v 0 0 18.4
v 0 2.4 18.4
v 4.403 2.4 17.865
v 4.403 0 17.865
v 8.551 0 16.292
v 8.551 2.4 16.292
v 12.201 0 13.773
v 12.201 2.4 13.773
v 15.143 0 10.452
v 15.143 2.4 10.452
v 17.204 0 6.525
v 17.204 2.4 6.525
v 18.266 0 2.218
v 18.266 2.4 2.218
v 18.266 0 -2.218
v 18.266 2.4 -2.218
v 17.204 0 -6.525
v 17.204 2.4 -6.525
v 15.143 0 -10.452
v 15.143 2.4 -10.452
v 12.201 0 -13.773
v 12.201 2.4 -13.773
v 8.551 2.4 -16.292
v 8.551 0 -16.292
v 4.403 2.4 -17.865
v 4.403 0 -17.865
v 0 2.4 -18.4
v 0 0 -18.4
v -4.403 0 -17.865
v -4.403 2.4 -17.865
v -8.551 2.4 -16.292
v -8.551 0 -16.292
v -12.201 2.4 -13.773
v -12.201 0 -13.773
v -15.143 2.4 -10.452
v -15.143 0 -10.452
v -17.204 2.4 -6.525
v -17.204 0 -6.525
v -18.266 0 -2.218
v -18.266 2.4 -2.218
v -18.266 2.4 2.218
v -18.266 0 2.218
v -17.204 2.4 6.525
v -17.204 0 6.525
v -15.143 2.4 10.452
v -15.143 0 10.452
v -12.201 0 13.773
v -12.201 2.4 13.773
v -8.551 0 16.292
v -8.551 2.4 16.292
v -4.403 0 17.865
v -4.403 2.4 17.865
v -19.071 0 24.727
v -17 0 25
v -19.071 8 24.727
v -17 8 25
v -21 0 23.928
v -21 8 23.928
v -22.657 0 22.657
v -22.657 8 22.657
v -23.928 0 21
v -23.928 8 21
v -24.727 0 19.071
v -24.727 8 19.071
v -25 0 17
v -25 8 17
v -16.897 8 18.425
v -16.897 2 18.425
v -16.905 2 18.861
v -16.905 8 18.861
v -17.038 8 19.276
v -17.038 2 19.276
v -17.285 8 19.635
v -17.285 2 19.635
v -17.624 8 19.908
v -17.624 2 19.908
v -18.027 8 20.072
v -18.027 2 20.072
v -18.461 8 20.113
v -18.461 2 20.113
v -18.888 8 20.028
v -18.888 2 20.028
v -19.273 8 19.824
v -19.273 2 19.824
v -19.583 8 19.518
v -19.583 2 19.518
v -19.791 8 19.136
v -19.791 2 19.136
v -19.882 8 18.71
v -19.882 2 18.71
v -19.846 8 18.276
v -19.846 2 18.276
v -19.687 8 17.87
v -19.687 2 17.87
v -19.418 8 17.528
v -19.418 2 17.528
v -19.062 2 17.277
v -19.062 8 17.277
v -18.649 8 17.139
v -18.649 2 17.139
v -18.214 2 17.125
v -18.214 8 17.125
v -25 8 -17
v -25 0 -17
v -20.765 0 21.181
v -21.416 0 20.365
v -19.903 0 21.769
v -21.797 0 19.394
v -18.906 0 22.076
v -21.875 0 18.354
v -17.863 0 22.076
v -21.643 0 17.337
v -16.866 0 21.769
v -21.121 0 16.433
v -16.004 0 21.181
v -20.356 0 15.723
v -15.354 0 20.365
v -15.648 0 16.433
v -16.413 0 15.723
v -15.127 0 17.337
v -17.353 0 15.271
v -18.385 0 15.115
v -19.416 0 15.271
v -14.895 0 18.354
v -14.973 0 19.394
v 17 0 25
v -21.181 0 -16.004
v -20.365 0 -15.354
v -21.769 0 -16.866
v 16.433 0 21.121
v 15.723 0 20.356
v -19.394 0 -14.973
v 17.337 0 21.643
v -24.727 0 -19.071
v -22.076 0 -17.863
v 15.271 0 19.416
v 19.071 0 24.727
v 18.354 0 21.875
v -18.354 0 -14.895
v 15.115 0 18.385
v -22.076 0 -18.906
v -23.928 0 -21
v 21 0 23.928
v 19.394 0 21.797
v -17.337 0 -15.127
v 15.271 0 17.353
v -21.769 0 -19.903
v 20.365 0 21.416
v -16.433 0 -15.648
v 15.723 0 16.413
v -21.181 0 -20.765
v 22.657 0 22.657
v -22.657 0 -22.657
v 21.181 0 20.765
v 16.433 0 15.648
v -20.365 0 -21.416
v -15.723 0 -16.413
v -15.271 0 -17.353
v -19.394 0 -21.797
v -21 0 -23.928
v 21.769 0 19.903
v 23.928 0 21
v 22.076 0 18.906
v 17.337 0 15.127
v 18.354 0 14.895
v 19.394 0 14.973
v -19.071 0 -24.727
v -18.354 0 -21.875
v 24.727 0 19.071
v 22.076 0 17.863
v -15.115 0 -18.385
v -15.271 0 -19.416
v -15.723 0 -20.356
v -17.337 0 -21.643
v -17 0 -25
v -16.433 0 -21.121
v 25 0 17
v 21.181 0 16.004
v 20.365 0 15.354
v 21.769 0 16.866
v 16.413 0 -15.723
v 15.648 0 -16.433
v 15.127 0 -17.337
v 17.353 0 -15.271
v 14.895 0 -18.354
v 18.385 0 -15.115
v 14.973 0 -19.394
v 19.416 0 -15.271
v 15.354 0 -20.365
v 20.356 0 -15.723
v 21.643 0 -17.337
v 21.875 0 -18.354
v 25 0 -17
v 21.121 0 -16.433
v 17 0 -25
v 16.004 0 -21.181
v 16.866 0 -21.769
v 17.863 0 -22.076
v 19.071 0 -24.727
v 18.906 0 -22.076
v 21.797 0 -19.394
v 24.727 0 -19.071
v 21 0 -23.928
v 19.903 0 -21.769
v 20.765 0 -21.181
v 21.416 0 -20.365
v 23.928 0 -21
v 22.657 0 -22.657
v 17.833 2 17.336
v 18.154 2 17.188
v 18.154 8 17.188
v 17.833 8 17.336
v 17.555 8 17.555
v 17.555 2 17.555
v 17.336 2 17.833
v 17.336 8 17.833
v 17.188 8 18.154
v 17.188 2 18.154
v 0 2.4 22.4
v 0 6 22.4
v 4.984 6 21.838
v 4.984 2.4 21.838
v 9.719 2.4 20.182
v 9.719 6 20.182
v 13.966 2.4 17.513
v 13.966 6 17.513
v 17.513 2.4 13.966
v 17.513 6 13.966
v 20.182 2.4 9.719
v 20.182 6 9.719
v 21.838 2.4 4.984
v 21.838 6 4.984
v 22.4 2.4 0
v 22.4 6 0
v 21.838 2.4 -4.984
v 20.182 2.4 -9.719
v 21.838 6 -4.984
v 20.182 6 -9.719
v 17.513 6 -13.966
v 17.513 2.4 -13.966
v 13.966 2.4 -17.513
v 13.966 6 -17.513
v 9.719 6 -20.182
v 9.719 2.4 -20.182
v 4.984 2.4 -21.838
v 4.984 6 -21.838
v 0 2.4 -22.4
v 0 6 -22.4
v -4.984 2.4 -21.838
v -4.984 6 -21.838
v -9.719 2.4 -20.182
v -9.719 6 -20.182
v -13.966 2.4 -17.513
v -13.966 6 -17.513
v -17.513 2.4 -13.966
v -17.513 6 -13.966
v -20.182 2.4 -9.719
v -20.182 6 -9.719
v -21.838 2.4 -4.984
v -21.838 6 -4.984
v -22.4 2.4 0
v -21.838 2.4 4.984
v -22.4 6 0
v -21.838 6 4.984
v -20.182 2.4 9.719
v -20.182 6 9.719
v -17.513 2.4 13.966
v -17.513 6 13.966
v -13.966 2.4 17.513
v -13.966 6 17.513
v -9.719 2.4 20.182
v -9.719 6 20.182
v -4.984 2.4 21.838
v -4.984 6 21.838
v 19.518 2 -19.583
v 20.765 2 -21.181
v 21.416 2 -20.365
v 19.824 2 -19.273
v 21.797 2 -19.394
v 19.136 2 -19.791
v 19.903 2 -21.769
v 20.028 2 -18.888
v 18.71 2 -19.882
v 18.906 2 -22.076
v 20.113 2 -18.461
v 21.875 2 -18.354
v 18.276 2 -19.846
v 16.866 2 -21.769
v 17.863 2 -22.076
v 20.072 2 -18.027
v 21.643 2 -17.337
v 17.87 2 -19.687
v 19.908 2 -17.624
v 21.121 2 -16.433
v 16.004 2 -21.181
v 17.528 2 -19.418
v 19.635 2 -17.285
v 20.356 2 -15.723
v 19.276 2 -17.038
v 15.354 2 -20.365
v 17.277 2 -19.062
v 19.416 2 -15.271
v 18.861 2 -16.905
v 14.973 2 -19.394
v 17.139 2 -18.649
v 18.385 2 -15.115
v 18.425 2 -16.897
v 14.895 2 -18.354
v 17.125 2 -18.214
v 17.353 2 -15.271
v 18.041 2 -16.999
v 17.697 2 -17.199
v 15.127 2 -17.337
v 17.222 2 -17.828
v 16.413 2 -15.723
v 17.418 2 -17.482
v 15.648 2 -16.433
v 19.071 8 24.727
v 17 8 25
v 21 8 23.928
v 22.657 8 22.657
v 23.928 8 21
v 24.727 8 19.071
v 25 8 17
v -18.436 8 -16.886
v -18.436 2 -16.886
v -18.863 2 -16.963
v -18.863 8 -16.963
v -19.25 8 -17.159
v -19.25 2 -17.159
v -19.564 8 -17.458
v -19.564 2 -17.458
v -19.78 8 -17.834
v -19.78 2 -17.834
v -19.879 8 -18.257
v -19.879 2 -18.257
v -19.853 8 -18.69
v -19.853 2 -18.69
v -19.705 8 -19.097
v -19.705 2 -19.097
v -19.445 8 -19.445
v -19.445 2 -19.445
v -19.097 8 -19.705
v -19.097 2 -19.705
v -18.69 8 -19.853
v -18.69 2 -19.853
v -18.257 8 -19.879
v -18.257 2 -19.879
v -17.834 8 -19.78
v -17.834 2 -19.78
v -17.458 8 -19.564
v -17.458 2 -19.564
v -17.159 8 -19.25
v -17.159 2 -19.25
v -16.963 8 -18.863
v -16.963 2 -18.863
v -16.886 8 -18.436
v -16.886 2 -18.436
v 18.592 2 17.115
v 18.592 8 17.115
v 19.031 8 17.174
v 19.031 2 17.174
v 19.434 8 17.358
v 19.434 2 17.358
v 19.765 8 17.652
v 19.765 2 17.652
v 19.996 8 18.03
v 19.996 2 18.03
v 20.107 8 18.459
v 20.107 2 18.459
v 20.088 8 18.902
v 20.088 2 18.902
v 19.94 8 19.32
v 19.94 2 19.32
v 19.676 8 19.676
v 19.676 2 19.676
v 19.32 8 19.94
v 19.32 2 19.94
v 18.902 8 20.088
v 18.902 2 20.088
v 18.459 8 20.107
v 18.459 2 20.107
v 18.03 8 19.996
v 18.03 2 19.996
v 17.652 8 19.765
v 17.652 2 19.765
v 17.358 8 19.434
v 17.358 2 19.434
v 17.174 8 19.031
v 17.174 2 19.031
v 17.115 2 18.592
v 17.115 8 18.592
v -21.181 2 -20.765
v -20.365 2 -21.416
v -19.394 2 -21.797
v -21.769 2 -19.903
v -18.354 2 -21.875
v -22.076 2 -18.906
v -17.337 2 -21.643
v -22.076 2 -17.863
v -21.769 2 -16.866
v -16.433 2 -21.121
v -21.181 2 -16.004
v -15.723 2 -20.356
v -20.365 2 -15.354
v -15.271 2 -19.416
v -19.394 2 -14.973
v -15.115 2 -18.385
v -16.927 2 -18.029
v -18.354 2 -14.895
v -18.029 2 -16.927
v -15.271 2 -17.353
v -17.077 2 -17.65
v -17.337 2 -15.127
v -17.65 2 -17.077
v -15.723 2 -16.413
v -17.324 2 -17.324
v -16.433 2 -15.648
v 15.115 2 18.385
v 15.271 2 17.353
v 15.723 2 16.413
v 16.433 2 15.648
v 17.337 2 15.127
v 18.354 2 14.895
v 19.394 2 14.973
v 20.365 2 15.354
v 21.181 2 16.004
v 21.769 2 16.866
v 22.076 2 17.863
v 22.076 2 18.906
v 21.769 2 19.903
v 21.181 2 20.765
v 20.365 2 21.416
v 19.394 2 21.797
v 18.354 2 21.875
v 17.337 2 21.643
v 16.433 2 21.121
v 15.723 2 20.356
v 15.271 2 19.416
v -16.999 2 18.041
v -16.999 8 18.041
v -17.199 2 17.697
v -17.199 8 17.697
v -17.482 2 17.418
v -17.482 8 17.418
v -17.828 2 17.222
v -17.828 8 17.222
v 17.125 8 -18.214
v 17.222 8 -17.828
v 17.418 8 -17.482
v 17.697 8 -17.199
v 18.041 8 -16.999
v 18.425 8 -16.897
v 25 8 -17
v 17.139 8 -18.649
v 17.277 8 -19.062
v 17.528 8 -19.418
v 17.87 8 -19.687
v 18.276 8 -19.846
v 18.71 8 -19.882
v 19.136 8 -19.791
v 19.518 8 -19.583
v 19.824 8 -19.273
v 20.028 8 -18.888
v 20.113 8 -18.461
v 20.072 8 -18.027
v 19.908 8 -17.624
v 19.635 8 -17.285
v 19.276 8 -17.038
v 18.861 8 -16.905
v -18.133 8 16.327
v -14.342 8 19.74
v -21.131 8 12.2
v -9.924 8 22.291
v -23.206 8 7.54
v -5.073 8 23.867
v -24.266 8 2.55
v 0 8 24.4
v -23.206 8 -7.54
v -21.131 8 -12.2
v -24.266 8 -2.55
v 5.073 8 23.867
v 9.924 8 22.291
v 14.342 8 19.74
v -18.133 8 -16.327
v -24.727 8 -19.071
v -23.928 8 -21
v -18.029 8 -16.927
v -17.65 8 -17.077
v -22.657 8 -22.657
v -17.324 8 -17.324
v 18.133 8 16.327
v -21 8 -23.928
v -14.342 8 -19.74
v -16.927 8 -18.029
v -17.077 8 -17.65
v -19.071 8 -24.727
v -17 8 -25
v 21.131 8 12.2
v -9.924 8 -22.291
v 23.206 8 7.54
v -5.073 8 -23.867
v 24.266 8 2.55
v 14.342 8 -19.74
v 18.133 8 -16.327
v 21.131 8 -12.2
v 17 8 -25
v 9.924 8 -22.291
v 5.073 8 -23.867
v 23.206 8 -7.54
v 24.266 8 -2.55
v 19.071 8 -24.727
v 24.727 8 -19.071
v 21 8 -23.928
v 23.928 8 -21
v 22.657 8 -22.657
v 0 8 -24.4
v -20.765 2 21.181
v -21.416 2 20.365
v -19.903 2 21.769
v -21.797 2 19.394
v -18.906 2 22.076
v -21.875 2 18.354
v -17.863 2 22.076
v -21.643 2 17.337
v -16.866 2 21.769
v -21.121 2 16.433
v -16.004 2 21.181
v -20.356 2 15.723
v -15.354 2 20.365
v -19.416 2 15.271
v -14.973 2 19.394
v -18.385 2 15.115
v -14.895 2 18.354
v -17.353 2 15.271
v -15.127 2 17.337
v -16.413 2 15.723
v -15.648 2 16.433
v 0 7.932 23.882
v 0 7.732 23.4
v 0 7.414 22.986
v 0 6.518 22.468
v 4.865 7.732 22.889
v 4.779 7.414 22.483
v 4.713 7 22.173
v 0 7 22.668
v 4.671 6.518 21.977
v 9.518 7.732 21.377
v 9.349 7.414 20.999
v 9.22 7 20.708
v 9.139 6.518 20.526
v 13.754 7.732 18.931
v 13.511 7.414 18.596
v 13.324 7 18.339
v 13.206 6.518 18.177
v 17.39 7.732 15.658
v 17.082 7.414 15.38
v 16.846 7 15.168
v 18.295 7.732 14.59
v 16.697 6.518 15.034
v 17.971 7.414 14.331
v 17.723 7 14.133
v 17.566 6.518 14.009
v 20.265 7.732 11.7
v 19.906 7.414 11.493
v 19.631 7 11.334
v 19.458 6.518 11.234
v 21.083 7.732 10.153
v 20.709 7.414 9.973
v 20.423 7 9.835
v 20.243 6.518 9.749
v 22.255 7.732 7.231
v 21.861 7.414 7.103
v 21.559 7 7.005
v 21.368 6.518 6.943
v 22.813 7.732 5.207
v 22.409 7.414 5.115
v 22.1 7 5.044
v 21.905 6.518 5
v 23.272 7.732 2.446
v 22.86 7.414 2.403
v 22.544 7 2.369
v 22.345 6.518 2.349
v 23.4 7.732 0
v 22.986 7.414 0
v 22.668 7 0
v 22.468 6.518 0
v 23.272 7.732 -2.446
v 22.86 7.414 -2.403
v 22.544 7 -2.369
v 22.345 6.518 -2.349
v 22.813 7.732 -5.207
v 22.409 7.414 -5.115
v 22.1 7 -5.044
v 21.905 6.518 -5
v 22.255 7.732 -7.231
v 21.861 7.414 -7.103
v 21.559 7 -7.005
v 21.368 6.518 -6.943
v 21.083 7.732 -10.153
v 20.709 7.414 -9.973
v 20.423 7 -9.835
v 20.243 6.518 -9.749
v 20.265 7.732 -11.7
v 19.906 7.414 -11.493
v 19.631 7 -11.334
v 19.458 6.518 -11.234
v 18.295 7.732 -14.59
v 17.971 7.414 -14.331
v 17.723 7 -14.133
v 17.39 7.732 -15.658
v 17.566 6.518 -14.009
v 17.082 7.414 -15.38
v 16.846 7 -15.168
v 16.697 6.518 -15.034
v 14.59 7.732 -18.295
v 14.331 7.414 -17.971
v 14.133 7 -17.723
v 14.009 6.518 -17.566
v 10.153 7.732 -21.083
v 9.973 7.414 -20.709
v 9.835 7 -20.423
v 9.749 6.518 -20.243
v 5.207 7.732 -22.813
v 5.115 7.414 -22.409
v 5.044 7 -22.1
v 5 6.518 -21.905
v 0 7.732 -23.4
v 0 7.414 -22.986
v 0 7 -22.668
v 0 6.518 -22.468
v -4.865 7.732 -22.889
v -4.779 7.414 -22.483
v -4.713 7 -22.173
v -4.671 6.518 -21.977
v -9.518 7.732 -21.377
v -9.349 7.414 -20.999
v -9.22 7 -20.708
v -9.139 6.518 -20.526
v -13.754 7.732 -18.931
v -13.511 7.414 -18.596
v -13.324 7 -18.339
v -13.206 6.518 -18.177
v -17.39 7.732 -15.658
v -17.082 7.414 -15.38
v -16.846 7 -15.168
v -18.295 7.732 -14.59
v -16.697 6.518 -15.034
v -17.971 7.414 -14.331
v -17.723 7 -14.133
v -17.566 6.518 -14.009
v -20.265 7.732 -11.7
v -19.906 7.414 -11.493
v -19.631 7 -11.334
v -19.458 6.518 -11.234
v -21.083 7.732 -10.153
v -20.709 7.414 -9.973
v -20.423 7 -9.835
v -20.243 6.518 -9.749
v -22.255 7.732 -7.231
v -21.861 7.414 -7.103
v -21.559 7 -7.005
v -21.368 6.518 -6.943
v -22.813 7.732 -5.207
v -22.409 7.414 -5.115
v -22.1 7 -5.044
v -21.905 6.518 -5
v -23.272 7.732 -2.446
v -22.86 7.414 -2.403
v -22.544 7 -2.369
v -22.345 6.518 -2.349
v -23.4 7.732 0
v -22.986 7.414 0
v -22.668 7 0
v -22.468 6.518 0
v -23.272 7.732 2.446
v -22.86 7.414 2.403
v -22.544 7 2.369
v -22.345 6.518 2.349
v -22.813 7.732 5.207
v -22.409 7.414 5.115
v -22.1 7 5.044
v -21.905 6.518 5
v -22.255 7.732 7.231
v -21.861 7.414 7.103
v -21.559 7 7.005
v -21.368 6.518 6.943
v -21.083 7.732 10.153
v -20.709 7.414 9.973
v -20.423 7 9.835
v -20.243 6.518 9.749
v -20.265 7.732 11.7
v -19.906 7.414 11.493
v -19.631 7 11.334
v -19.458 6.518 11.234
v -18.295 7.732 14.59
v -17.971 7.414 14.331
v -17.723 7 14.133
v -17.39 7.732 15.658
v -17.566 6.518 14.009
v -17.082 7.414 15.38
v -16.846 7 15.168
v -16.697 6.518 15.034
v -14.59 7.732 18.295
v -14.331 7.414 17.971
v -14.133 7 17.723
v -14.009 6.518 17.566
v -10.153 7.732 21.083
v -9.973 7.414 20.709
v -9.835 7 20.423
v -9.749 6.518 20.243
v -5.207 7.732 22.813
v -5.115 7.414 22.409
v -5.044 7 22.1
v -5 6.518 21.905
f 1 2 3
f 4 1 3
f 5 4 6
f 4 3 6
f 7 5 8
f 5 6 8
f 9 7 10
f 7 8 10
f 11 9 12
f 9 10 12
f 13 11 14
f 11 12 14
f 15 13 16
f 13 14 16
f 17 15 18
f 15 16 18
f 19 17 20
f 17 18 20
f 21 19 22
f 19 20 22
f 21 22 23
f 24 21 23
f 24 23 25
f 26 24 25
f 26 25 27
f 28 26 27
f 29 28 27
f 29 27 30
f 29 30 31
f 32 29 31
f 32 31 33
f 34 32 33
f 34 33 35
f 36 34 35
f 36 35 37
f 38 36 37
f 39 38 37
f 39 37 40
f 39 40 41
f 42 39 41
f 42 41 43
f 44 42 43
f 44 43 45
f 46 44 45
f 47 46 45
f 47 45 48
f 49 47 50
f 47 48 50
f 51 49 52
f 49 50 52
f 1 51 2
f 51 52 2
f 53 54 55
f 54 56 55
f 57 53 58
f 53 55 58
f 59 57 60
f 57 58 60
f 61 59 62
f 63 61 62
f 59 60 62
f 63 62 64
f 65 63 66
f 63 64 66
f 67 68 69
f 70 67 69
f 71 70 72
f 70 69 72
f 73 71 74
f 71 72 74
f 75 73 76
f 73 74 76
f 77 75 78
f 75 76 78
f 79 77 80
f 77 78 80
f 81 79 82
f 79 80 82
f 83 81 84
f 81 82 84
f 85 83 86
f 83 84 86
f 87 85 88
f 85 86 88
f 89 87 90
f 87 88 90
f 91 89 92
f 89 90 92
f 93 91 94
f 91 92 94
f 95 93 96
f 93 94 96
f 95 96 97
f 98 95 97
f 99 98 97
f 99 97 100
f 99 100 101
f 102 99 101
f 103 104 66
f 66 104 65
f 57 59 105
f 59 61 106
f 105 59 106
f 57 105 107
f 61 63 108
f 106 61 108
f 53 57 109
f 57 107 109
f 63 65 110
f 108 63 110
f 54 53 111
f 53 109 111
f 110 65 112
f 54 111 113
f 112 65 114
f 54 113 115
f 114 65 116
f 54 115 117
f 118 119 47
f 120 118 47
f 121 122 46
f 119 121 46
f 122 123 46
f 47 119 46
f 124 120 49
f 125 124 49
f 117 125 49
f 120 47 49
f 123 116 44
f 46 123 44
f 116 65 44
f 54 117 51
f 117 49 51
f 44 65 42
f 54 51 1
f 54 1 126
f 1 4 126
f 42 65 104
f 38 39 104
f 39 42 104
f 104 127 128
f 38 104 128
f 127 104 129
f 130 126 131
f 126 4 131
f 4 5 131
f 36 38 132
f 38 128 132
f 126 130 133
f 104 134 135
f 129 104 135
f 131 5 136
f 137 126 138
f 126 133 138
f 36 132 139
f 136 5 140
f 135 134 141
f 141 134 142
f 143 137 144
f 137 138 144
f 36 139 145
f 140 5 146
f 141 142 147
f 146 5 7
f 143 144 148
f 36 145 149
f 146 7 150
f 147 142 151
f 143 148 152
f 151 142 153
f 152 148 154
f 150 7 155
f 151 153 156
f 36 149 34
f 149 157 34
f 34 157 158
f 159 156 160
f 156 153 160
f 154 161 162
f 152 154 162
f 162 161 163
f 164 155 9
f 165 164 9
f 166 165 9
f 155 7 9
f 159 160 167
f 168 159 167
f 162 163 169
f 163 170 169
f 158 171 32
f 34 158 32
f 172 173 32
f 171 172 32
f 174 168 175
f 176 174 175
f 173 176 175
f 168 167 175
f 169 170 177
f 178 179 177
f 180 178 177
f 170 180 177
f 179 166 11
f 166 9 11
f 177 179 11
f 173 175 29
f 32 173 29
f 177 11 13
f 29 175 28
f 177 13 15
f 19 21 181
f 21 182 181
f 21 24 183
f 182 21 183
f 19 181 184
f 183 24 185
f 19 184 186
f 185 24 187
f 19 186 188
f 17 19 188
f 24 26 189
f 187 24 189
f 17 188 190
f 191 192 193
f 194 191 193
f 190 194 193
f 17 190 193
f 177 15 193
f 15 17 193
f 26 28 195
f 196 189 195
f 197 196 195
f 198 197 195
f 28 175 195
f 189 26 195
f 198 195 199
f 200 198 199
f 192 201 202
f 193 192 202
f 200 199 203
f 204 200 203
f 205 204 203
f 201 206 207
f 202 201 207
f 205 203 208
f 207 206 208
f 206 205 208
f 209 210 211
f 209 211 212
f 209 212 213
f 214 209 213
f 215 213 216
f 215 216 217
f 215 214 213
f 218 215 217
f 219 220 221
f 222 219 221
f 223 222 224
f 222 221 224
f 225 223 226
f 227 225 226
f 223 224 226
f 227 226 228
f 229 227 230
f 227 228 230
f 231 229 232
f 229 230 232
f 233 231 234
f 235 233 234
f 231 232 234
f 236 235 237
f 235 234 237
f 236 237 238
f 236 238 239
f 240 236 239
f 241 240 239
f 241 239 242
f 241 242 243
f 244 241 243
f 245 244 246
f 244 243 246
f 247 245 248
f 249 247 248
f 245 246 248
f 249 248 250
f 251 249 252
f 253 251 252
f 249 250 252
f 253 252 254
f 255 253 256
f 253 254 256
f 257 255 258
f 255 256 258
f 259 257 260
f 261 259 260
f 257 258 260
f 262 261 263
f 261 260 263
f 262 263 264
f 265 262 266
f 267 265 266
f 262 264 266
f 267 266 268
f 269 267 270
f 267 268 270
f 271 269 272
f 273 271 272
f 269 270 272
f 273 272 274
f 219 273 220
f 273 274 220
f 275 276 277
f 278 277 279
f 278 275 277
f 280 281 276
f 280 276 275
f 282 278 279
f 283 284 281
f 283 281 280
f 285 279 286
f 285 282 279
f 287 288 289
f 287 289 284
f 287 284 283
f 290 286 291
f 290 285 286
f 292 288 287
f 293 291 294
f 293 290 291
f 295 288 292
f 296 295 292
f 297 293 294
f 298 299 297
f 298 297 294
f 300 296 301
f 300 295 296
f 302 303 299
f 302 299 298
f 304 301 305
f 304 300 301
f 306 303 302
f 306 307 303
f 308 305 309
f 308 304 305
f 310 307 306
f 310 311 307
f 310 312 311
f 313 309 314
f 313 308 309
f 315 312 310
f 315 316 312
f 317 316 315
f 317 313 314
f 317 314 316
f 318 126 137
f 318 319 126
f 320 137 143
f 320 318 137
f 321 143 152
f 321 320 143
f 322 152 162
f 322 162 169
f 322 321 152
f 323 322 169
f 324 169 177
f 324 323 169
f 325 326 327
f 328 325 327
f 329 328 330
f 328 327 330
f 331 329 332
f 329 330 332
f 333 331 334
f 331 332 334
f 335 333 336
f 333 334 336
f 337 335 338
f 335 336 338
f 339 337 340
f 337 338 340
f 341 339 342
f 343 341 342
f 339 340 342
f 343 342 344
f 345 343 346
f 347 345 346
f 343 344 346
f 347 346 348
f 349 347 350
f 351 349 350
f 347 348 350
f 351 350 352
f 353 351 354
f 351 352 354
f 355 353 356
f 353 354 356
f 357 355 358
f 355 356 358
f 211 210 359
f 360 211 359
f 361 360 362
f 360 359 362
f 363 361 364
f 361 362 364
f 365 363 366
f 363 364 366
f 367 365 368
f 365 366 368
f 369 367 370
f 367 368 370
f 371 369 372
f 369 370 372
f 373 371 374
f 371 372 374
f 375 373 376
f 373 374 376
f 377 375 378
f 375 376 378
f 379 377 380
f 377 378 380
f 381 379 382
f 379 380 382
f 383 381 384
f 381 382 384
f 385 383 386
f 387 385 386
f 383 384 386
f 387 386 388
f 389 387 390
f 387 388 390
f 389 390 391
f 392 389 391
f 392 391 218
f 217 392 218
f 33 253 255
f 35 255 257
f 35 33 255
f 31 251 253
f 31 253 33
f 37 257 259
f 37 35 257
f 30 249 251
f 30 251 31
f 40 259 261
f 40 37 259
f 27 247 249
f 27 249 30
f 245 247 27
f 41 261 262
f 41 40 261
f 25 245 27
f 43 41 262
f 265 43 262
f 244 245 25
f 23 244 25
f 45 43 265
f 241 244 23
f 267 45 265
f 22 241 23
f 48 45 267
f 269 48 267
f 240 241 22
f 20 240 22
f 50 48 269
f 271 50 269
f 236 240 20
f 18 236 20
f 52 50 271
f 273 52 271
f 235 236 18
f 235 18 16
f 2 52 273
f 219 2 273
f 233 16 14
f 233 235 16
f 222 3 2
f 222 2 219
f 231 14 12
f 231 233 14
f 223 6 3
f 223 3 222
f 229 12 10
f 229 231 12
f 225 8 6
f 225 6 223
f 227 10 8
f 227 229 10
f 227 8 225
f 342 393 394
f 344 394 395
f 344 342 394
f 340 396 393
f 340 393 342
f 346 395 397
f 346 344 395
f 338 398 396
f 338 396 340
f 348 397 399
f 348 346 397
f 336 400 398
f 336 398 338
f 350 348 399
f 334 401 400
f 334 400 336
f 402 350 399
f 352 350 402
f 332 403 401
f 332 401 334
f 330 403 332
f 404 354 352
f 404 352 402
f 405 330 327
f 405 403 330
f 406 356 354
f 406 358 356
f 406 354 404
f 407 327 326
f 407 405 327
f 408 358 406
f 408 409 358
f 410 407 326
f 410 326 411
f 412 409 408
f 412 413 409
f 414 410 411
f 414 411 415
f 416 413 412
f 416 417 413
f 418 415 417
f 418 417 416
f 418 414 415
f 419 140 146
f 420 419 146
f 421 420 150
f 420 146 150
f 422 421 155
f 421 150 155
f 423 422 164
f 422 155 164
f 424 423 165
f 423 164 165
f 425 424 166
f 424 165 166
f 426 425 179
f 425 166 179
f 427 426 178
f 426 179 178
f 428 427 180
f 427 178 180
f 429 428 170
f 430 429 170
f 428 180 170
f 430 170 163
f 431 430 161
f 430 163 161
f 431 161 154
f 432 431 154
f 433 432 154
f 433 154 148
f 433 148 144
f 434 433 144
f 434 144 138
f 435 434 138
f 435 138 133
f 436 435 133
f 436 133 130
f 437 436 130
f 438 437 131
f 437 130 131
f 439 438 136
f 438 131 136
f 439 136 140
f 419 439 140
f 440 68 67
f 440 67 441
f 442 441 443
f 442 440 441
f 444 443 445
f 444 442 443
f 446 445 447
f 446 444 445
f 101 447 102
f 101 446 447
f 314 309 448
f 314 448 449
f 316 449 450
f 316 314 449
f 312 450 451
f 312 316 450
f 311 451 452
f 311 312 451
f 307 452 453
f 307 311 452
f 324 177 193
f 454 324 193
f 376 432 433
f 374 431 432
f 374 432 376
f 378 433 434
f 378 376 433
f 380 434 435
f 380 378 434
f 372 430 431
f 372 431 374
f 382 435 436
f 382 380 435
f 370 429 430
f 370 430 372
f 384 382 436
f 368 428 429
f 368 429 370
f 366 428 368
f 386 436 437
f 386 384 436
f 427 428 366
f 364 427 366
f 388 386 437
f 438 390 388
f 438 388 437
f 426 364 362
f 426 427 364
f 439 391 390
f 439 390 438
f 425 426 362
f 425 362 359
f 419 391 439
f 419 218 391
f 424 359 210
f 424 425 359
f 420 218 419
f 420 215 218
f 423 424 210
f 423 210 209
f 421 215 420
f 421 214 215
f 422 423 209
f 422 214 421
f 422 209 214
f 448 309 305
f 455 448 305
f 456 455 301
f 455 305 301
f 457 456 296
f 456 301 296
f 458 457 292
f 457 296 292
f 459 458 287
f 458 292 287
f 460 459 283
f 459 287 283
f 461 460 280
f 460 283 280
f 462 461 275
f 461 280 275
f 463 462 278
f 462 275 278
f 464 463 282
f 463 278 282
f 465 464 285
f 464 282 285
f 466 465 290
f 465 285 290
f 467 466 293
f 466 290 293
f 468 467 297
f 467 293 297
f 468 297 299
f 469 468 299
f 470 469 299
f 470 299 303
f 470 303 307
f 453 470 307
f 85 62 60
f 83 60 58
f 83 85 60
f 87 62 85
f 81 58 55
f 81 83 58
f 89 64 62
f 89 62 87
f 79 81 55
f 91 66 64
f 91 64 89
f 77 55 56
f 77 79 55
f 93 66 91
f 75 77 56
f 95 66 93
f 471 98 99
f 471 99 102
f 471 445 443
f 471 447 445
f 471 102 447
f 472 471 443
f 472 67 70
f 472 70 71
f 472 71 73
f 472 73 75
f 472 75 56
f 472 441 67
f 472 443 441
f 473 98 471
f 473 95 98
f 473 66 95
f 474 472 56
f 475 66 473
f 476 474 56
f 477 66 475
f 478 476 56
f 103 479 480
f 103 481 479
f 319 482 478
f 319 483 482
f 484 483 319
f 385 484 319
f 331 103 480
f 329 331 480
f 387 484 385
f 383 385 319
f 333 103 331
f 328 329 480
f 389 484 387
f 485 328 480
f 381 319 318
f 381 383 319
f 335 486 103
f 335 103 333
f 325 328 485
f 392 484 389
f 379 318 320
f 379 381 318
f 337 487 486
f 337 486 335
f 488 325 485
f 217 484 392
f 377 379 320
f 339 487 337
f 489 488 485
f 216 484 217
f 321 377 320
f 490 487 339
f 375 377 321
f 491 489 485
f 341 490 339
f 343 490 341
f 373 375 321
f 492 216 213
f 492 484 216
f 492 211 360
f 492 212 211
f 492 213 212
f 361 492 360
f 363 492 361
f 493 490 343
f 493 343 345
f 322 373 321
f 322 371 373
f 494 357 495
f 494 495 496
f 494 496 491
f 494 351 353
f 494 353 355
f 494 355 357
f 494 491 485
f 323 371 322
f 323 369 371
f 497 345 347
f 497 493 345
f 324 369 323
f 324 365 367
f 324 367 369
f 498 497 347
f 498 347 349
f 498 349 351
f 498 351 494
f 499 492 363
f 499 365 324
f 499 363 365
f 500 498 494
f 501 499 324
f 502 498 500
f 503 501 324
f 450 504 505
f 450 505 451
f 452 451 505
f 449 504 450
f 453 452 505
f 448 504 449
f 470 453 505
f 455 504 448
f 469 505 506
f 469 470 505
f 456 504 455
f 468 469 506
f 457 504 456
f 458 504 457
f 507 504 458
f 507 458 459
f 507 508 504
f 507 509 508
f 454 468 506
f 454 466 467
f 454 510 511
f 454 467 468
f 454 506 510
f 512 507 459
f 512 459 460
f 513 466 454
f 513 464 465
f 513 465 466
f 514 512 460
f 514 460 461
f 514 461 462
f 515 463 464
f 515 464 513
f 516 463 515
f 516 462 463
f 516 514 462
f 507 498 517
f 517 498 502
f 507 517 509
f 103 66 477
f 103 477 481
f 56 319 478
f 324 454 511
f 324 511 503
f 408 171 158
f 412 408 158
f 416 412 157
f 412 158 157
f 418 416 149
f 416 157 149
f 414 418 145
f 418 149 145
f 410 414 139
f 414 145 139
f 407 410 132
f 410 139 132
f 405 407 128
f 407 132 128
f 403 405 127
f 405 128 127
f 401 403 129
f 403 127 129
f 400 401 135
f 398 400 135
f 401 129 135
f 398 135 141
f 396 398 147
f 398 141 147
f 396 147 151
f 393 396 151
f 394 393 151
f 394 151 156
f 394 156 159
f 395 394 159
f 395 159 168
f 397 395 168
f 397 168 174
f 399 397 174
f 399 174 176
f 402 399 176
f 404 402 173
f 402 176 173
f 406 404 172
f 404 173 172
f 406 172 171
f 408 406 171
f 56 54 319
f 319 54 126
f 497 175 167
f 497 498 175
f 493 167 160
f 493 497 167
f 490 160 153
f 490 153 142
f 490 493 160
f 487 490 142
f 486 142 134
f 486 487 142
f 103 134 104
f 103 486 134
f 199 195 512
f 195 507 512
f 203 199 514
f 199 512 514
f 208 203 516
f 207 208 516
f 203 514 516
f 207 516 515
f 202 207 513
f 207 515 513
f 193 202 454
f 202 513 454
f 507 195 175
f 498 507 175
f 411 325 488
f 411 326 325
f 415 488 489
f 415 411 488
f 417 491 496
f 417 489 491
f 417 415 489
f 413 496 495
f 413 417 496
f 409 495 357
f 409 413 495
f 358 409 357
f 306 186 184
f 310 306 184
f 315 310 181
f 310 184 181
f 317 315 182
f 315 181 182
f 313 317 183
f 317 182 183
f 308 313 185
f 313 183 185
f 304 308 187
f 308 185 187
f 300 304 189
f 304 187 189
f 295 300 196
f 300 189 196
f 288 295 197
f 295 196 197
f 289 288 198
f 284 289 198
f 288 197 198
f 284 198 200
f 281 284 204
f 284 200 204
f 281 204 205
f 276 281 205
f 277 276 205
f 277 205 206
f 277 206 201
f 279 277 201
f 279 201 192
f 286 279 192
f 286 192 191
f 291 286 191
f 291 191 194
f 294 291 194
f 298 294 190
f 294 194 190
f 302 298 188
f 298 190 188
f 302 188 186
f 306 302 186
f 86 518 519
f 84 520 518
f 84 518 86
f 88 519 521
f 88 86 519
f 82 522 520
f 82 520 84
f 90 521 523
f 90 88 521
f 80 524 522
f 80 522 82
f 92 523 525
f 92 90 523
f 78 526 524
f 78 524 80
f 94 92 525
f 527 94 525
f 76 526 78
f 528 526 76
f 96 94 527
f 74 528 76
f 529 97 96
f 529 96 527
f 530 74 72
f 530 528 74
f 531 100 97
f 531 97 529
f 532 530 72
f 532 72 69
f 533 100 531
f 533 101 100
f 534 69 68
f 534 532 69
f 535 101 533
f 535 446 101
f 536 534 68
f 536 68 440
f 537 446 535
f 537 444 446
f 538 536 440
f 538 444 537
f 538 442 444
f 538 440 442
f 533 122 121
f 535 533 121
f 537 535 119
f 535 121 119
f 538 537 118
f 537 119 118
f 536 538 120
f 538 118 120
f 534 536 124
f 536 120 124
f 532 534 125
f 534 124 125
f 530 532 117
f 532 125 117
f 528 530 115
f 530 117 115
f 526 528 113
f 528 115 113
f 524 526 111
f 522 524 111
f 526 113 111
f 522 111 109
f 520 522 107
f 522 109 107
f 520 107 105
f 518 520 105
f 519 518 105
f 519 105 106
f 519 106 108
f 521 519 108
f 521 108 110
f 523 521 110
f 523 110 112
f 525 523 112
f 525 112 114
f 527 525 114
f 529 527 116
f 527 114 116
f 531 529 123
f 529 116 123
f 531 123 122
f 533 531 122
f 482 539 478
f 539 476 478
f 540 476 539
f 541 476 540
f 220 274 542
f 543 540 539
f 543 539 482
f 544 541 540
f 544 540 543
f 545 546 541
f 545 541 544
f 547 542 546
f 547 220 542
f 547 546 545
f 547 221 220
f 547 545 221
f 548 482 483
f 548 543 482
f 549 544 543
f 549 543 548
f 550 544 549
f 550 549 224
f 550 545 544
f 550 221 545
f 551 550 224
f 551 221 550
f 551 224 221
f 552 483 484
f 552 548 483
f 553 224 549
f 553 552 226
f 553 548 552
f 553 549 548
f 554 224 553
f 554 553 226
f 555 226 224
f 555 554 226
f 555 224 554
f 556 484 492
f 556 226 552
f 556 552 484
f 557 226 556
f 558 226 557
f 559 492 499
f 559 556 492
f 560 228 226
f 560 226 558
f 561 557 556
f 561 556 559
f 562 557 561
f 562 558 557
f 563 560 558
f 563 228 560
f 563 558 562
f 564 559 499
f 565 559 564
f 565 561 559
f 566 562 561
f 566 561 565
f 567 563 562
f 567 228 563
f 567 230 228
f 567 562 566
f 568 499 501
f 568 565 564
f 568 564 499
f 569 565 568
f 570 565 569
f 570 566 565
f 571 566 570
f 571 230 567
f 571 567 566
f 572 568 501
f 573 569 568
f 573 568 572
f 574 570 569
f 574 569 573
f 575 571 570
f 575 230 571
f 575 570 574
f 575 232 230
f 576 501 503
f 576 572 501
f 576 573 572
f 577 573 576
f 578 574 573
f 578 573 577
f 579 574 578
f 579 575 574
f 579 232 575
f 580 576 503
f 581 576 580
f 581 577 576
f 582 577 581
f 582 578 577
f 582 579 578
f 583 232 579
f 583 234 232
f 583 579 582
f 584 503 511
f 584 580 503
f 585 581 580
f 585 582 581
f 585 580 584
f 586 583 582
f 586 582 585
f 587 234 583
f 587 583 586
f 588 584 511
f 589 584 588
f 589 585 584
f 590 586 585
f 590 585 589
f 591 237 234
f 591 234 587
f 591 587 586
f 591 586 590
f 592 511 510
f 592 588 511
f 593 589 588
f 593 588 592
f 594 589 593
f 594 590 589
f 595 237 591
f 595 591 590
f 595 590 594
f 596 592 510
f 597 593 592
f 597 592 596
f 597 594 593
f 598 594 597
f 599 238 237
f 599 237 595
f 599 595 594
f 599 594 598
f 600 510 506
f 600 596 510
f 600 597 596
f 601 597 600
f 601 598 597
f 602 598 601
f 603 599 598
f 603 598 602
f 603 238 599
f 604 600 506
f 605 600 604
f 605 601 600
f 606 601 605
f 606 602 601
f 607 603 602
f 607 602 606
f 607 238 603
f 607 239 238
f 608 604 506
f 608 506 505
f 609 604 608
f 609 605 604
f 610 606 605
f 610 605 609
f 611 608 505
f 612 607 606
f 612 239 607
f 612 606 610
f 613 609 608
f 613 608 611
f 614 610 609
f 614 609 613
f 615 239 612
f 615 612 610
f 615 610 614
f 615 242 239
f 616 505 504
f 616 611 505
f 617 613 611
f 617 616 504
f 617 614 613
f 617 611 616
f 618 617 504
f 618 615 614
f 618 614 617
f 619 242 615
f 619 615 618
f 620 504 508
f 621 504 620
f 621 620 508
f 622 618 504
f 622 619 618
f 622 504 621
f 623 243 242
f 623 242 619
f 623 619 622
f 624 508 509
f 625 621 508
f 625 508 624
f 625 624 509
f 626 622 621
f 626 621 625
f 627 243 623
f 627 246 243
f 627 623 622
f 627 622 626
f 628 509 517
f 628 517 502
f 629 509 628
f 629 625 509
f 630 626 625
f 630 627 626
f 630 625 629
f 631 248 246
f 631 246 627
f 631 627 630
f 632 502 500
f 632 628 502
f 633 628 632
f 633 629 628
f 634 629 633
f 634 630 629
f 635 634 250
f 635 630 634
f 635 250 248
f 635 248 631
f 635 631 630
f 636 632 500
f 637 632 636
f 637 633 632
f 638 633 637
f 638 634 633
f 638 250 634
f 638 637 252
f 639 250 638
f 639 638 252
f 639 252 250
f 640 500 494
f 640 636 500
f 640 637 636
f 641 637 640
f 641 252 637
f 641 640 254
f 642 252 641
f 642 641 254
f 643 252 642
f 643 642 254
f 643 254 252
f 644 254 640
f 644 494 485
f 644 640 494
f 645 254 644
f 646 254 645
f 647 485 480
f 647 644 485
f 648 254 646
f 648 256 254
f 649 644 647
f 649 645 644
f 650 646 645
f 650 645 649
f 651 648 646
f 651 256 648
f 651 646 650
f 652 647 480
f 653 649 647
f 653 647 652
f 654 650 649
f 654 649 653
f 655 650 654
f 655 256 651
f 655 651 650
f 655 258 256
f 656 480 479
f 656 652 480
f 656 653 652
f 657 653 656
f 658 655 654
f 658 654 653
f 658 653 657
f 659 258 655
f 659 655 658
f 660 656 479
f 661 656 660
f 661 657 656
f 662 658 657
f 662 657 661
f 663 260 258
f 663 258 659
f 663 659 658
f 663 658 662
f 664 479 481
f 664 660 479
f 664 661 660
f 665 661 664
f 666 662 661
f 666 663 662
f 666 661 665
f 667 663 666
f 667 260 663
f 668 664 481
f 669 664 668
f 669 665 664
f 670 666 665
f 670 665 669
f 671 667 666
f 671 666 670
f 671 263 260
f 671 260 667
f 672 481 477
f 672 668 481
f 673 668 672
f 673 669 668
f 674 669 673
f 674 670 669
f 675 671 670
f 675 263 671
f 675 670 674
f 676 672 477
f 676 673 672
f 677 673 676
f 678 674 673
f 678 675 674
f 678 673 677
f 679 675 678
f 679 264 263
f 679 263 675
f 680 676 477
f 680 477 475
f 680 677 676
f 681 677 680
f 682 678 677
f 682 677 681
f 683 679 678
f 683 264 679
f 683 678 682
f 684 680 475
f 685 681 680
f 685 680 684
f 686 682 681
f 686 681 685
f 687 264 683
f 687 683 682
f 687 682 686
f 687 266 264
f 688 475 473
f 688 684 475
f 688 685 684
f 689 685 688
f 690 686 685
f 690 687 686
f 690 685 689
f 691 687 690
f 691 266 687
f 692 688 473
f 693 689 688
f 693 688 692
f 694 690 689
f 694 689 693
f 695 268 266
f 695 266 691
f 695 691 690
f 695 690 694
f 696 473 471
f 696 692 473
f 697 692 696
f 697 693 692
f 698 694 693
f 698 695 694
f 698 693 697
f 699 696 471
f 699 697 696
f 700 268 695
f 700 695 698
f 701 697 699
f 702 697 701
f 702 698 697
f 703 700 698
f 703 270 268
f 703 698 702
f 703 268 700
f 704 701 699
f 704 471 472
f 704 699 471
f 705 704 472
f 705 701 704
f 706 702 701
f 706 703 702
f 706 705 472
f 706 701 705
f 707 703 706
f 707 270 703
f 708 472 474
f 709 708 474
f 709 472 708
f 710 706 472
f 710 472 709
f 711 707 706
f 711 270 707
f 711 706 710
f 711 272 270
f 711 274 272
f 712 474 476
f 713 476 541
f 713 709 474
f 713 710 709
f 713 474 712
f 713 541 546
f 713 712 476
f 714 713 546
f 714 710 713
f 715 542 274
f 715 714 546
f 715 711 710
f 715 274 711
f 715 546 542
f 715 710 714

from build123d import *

# Parameters (mm, degrees)
SKETCH_1_R               = 25
EXTRUDE_1_DEPTH          = 8
SKETCH_2_R               = 22.4
CUT_EXTRUDE_1_DEPTH      = 5.6
SKETCH_3_R               = 18.4
CUT_EXTRUDE_2_DEPTH      = 12.5
EXTRUDE_2_DEPTH          = 8
FILLET_1_R               = 8
CUT_EXTRUDE_START        = -15
SKETCH_5_R               = 1.5
CUT_EXTRUDE_3_DEPTH      = 15
FILLET_2_R               = 2
SKETCH_6_R               = 3.5
CUT_EXTRUDE_4_DEPTH      = 2
PATTERN_CIRCULAR_1_COUNT = 4


with BuildPart() as part:
    # 草图1 → 凸台-拉伸1 (new body)
    with BuildSketch(Plane(origin=(0, 0, 0), x_dir=(1, 0, 0), z_dir=(0, 1, 0))):
        with Locations(Location((0, 0, 0), (0, 0, 270))):
            Circle(SKETCH_1_R)
    extrude(amount=EXTRUDE_1_DEPTH)

    # 草图2 → 切除-拉伸1 (cut)
    with BuildSketch(Plane(origin=(0, 8, 0), x_dir=(1, 0, 0), z_dir=(0, 1, 0))):
        with Locations(Location((0, 0, 0), (0, 0, 270))):
            Circle(SKETCH_2_R)
    extrude(amount=-CUT_EXTRUDE_1_DEPTH, mode=Mode.SUBTRACT)

    # 草图3 → 切除-拉伸2 (cut)
    with BuildSketch(Plane(origin=(0, 2.4, 0), x_dir=(1, 0, 0), z_dir=(0, 1, 0))):
        with Locations(Location((0, 0, 0), (0, 0, 270))):
            Circle(SKETCH_3_R)
    extrude(amount=-CUT_EXTRUDE_2_DEPTH, mode=Mode.SUBTRACT)

    # 草图4 → 凸台-拉伸2 (add)
    with BuildSketch(Plane(origin=(0, 0, 0), x_dir=(1, 0, 0), z_dir=(0, 1, 0))):
        with BuildLine():
            Line((0, 25), (-25, 25))
            Line((-25, 25), (-25, 2.6e-08))
            ThreePointArc((-25, 2.6e-08), (-23.301207713, 9.058350794), (-18.435702489, 16.885641052))
            ThreePointArc((-18.435702489, 16.885641052), (-19.445436483, 19.445436483), (-16.885641052, 18.435702489))
            ThreePointArc((-16.885641052, 18.435702489), (-9.058350782, 23.301207718), (0, 25))
        make_face()
        with BuildLine():
            Line((25, 25), (0, 25))
            ThreePointArc((0, 25), (9.210354363, 23.241544108), (17.125028574, 18.213549801))
            ThreePointArc((17.125028574, 18.213549801), (19.682469279, 19.438809921), (18.425448396, 16.896829626))
            ThreePointArc((18.425448396, 16.896829626), (23.298457137, 9.065423048), (25, 0))
            Line((25, 0), (25, 25))
        make_face()
        with BuildLine():
            ThreePointArc((-18.213549801, -17.125028574), (-23.241544113, -9.210354351), (-25, 2.6e-08))
            Line((-25, 2.6e-08), (-25, -25))
            Line((-25, -25), (-5.8e-08, -25))
            ThreePointArc((-5.8e-08, -25), (-9.065423076, -23.298457126), (-16.896829626, -18.425448396))
            ThreePointArc((-16.896829626, -18.425448396), (-19.438809921, -19.682469279), (-18.213549801, -17.125028574))
        make_face()
        with BuildLine():
            Line((25, -25), (25, 0))
            ThreePointArc((25, 0), (23.22561674, -9.250444694), (18.154341838, -17.18778265))
            ThreePointArc((18.154341838, -17.18778265), (19.675883861, -19.675883861), (17.18778265, -18.154341838))
            ThreePointArc((17.18778265, -18.154341838), (9.250444666, -23.225616751), (-5.8e-08, -25))
            Line((-5.8e-08, -25), (25, -25))
        make_face()
    extrude(amount=EXTRUDE_2_DEPTH)

    # 圆角1
    fillet_1_edges = [part.edges().sort_by_distance(p)[0] for p in [
        (-25, 4, -25),
        (25, 4, -25),
        (-25, 4, 25),
        (25, 4, 25),
    ]]
    fillet(fillet_1_edges, radius=FILLET_1_R)

    # 草图5 → 切除-拉伸3 (cut)
    with BuildSketch(Plane(origin=(0, 8, 0), x_dir=(1, 0, 0), z_dir=(0, 1, 0)).offset(CUT_EXTRUDE_START)):
        with Locations(Location((-18.384776311, 18.384776311, 0), (0, 0, 270))):
            Circle(SKETCH_5_R)
        with Locations(Location((18.615223689, 18.384776311, 0), (0, 0, 270))):
            Circle(SKETCH_5_R)
        with Locations(Location((18.615223689, -18.615223689, 0), (0, 0, 270))):
            Circle(SKETCH_5_R)
        with Locations(Location((-18.384776311, -18.615223689, 0), (0, 0, 270))):
            Circle(SKETCH_5_R)
    extrude(amount=CUT_EXTRUDE_3_DEPTH, mode=Mode.SUBTRACT)

    # 圆角2
    fillet_2_edges = [part.edges().sort_by_distance(p)[0] for p in [
        (0, 8, -22.4),
    ]]
    fillet(fillet_2_edges, radius=FILLET_2_R)

    # 草图6 → 切除-拉伸4 (cut)
    with BuildSketch(Plane.XZ):
        with Locations(Location((-18.384776311, 18.615223689, 0), (0, 0, 270))):
            Circle(SKETCH_6_R)
    cut_extrude_4 = extrude(amount=-CUT_EXTRUDE_4_DEPTH, mode=Mode.SUBTRACT)

    # 阵列(圆周)1: 切除-拉伸4 ×4 about axis
    pattern_circular_1_axis = Axis((0, 0, 0), (0, 1, 0))
    for i in range(1, PATTERN_CIRCULAR_1_COUNT):
        add(cut_extrude_4.rotate(pattern_circular_1_axis, i * 360 / PATTERN_CIRCULAR_1_COUNT), mode=Mode.SUBTRACT)


solid = part.part
